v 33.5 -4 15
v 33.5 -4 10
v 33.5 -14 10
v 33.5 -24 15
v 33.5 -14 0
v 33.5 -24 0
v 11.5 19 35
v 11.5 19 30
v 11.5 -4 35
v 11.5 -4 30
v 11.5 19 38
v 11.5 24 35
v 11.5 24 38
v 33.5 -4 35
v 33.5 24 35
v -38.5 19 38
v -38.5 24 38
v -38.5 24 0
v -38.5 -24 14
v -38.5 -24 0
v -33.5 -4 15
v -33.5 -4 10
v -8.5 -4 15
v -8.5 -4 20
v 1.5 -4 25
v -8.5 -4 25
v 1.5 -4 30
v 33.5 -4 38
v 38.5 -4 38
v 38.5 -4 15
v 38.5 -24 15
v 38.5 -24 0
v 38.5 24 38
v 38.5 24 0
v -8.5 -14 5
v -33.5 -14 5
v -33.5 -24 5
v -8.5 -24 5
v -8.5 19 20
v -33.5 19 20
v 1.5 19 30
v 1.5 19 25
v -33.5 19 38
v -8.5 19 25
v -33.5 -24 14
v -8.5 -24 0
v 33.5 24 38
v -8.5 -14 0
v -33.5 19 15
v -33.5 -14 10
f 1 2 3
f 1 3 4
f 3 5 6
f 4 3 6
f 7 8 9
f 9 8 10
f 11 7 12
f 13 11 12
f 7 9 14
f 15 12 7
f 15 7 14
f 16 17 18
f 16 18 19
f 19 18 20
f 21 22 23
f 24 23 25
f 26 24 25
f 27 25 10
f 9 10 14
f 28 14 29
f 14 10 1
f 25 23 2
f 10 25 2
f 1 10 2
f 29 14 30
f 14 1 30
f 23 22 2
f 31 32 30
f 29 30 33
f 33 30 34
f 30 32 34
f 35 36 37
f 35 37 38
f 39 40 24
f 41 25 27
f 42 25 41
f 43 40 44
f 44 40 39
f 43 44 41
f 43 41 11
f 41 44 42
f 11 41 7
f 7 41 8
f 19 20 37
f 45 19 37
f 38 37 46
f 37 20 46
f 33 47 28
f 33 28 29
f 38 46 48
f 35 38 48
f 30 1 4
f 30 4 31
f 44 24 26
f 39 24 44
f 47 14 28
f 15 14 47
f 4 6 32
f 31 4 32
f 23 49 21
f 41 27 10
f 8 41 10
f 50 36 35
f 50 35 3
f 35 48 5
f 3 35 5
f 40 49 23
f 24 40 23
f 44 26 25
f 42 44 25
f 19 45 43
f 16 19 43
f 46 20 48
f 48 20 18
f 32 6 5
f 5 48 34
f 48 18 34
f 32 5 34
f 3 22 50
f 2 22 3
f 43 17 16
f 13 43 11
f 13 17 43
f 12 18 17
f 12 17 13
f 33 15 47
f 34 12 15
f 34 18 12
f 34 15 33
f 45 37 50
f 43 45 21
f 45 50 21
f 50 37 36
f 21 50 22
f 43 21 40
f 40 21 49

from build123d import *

# Parameters (mm, degrees)
F1_DEPTH  = 38
F0_W      = 25
F0_H      = 10
F3_DEPTH  = 5
F4_DEPTH  = 10
F5_DEPTH  = 15
F6_DEPTH  = 20
F7_DEPTH  = 25
F0_W_2    = 10
F0_H_2    = 23
F8_DEPTH  = 25
F9_DEPTH  = 30
F10_DEPTH = 35
F0_W_3    = 5
F0_H_3    = 28
F11_DEPTH = 38
F12_DEPTH = 15


# Not quite as in the source:
# - a feature names something its author has since deleted; it is built from what else it names


with BuildPart() as f1:
    # F0 (on Top) → F1 (new body)
    with BuildSketch(Plane.XY):
        Polygon((-33.5, 19), (-38.5, 19), (-38.5, -24), (-33.5, -24), (-33.5, -14), (-33.5, -4), align=None)
        Polygon((11.5, 24), (-38.5, 24), (-38.5, 19), (-33.5, 19), (-8.5, 19), (1.5, 19), (11.5, 19), align=None)
    extrude(amount=F1_DEPTH)

    # F0 (on Top) → F3 (join)
    with BuildSketch(Plane.XY):
        with Locations((-21, -19)):
            Rectangle(F0_W, F0_H)
    extrude(amount=F3_DEPTH)

    # F0 (on Top) → F4 (join)
    with BuildSketch(Plane.XY):
        Polygon((33.5, -14), (33.5, -4), (11.5, -4), (1.5, -4), (-8.5, -4), (-33.5, -4), (-33.5, -14), (-8.5, -14), align=None)
    extrude(amount=F4_DEPTH)

    # F0 (on Top) → F5 (join)
    with BuildSketch(Plane.XY):
        Polygon((-8.5, -4), (-33.5, 19), (-33.5, -4), align=None)
    extrude(amount=F5_DEPTH)

    # F0 (on Top) → F6 (join)
    with BuildSketch(Plane.XY):
        Polygon((-8.5, 19), (-33.5, 19), (-8.5, -4), align=None)
    extrude(amount=F6_DEPTH)

    # F2 (on face) → F7 (cut)
    with BuildSketch(Plane.YZ.offset(-33.5)):
        Polygon((-24, 14), (19, 38), (-24, 38), align=None)
    extrude(amount=-F7_DEPTH, mode=Mode.SUBTRACT)

    # F0 (on Top) → F8 (join)
    with BuildSketch(Plane.XY):
        with Locations((-3.5, 7.5)):
            Rectangle(F0_W_2, F0_H_2)
    extrude(amount=F8_DEPTH)

    # F0 (on Top) → F9 (join)
    with BuildSketch(Plane.XY):
        with Locations((6.5, 7.5)):
            Rectangle(F0_W_2, F0_H_2)
    extrude(amount=F9_DEPTH)

    # F0 (on Top) → F10 (join)
    with BuildSketch(Plane.XY):
        Polygon((33.5, 24), (11.5, 24), (11.5, 19), (11.5, -4), (33.5, -4), align=None)
    extrude(amount=F10_DEPTH)

    # F0 (on Top) → F11 (join)
    with BuildSketch(Plane.XY):
        with Locations((36, 10)):
            Rectangle(F0_W_3, F0_H_3)
    extrude(amount=F11_DEPTH)

    # F0 (on Top) → F12 (join)
    with BuildSketch(Plane.XY):
        Polygon((38.5, -4), (33.5, -4), (33.5, -14), (33.5, -24), (38.5, -24), align=None)
    extrude(amount=F12_DEPTH)


solid = f1.part
